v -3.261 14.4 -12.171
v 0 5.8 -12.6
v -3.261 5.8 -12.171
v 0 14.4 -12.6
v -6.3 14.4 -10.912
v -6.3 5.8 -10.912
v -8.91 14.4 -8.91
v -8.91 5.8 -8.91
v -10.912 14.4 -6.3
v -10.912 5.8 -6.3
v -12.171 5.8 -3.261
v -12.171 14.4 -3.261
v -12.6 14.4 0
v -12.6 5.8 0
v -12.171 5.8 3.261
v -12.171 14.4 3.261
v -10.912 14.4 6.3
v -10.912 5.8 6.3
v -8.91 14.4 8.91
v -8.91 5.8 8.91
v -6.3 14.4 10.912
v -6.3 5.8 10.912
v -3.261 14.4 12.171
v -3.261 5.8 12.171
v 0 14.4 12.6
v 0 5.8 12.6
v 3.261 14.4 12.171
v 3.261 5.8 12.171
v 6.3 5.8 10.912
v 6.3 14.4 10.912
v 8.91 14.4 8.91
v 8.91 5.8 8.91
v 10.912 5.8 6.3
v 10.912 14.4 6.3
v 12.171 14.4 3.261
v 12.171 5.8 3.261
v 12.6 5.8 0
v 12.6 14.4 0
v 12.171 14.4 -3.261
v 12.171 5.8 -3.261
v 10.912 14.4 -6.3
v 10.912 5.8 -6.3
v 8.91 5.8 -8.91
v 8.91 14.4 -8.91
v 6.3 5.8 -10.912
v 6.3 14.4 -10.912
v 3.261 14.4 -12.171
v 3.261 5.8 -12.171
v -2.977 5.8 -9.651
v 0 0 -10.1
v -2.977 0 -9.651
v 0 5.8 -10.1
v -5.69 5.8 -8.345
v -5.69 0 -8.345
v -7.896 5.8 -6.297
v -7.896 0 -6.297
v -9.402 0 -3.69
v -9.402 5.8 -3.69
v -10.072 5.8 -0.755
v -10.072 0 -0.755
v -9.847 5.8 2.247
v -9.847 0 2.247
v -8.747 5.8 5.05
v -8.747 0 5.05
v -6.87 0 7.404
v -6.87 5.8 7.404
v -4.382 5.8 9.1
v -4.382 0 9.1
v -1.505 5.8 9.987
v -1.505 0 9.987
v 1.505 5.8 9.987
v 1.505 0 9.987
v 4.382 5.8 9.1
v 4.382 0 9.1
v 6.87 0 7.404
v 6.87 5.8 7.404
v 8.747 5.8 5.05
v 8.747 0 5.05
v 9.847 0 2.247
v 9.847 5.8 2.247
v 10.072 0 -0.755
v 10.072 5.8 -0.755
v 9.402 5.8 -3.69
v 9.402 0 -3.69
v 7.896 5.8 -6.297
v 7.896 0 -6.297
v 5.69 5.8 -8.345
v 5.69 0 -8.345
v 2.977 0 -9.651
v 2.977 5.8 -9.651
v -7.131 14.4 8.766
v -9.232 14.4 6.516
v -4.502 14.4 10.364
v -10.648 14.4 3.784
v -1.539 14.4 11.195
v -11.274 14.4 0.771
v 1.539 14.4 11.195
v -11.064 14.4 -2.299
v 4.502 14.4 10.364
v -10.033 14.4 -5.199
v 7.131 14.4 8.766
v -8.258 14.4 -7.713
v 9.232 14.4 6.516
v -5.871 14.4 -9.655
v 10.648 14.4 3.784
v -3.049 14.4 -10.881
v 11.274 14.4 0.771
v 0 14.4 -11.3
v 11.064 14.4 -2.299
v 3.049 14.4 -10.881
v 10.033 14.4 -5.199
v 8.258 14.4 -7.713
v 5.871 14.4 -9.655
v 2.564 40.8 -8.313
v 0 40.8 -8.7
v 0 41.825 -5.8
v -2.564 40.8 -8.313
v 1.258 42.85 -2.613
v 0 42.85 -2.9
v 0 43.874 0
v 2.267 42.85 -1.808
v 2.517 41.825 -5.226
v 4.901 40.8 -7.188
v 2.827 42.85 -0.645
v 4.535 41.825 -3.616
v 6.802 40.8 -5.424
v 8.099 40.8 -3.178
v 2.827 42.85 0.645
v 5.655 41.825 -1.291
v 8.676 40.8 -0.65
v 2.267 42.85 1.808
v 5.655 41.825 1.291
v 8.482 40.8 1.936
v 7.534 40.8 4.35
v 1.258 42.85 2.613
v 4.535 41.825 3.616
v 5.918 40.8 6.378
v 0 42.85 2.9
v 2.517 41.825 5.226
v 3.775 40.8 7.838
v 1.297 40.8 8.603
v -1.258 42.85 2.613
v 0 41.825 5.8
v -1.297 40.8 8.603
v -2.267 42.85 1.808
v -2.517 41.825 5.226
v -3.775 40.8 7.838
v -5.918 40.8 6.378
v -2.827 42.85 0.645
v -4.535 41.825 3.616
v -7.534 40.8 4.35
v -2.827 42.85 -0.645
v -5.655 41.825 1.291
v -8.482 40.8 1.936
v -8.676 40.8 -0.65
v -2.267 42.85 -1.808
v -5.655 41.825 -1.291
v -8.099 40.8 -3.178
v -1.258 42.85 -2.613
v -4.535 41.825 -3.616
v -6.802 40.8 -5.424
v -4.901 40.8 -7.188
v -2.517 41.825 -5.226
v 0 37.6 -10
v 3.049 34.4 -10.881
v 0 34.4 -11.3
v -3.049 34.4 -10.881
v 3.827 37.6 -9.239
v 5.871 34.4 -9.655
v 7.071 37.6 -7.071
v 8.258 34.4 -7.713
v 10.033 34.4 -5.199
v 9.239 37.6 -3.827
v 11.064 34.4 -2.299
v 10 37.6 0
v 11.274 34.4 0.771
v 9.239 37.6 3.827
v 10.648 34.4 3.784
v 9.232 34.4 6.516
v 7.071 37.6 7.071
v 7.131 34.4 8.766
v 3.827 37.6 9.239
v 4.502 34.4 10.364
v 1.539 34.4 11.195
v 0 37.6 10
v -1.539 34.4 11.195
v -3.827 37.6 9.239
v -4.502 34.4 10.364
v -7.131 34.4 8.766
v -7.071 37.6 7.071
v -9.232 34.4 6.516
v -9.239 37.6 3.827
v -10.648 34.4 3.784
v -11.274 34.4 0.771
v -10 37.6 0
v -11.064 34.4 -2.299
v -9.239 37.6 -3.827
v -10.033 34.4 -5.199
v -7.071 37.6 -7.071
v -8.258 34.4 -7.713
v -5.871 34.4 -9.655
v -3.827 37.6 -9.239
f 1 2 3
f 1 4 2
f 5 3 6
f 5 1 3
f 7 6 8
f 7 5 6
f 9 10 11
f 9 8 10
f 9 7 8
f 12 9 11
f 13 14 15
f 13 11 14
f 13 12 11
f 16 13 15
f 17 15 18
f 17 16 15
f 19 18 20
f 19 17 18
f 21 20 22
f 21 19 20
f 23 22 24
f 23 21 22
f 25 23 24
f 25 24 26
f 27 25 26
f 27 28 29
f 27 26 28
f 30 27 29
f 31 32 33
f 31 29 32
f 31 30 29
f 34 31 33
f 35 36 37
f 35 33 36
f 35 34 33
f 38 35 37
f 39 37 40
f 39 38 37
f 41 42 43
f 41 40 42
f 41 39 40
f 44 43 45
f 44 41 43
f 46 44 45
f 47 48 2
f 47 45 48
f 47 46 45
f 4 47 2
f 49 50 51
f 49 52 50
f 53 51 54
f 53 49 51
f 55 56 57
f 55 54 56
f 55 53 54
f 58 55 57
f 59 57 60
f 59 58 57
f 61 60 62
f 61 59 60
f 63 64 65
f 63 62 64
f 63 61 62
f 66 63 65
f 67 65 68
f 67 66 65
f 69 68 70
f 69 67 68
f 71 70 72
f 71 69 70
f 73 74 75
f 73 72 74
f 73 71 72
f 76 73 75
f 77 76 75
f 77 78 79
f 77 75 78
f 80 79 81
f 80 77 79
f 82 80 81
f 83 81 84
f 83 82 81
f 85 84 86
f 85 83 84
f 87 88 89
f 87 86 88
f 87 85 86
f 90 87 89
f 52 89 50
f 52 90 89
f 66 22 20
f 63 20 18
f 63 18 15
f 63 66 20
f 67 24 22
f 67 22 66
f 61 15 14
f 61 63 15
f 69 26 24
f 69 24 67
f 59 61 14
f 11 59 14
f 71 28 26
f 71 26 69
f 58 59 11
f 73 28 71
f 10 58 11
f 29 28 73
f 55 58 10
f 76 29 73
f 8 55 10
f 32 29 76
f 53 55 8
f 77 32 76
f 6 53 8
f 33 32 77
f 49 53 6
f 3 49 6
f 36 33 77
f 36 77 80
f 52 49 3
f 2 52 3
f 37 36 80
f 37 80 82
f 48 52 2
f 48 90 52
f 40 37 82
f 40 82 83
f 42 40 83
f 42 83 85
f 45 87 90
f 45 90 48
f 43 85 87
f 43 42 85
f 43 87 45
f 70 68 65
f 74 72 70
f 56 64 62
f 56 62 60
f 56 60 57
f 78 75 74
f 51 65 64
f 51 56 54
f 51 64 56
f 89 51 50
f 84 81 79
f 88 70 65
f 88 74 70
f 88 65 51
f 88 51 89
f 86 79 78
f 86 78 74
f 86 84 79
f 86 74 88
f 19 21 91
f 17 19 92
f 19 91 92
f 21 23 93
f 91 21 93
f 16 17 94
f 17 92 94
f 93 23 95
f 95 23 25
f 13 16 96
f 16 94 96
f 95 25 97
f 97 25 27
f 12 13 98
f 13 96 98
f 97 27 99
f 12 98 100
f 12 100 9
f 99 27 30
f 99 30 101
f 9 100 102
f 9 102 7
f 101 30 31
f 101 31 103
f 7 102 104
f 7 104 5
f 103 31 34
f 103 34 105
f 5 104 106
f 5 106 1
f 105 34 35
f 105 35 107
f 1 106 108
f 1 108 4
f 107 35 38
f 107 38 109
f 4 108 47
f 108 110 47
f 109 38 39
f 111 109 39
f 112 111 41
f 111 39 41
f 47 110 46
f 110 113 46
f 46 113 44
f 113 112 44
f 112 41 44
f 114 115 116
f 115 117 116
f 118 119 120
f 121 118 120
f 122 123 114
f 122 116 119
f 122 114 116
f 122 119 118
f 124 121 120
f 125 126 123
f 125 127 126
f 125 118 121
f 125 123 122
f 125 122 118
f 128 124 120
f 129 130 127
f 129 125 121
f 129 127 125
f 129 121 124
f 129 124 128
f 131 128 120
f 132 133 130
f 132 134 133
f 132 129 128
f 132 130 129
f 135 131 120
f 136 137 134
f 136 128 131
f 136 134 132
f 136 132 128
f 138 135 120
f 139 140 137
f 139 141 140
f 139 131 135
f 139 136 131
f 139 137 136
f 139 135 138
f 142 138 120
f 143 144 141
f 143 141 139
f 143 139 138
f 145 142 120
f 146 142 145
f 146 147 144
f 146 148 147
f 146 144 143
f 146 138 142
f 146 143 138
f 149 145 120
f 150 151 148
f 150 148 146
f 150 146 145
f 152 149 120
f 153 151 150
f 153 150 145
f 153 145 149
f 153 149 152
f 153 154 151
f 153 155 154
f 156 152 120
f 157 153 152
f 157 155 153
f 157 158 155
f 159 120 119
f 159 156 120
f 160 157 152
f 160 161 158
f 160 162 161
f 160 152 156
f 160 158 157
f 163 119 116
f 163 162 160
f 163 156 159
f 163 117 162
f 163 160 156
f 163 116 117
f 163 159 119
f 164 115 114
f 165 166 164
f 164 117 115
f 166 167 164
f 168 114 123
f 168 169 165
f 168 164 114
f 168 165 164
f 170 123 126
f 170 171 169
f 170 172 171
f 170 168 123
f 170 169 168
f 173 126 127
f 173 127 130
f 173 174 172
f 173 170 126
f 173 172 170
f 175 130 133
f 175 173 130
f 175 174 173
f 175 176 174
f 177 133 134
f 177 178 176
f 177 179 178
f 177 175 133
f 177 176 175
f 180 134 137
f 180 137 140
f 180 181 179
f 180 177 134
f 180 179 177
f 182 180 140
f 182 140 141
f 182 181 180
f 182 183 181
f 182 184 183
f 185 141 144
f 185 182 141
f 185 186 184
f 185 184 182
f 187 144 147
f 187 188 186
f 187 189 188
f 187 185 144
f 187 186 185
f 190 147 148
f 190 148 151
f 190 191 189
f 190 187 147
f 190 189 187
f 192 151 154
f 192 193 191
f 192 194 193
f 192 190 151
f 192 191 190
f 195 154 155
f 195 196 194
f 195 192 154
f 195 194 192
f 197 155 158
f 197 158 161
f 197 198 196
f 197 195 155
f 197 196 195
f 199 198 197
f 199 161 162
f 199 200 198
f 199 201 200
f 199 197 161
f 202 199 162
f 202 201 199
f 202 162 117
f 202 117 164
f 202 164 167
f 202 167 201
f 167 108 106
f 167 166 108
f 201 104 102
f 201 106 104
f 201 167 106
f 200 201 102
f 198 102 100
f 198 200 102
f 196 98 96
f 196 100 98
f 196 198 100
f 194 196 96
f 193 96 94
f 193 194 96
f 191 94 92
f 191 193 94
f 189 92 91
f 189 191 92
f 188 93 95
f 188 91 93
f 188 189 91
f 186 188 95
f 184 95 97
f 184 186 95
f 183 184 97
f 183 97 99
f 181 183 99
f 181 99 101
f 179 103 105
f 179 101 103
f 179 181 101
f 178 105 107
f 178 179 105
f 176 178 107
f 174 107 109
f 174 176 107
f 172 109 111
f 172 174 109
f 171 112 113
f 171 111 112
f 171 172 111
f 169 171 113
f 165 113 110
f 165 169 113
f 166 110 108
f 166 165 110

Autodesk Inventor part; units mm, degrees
ref_plane "YZ Plane" through (0, 0, 0) normal (1, 0, 0) x (0, 1, 0)
ref_plane "XZ Plane" through (0, 0, 0) normal (0, 1, 0) x (-1, 0, 0)
ref_plane "XY Plane" through (0, 0, 0) normal (0, 0, 1) x (1, 0, 0)
sketch "Sketch1" plane through (0, 0, 0) normal (1, 0, 0) x (0, 1, 0)
  line L0 (0, 0) -> (0, -10.1)
  line L1 (0, -10.1) -> (5.8, -10.1)
  line L2 (5.8, -10.1) -> (5.8, -12.6)
  line L3 (5.8, -12.6) -> (14.4, -12.6)
  line L4 (14.4, -12.6) -> (14.4, -11.3)
  line L5 (14.4, -11.3) -> (34.4, -11.3)
  line L6 (34.4, -11.3) -> (40.8, -11.3)
  line L7 (40.8, -11.3) -> (40.8, -8.7)
  line L8 (40.8, -8.7) -> (34.4, -11.3)
  line L9 (40.8, -8.7) -> (43.8745, 0)
  line L10 (43.8745, 0) -> (0, 0)
  dimension "d0" = 10.1
  dimension "d1" = 5.8
  dimension "d2" = 90
  dimension "d3" = 2.5
  dimension "d4" = 90
  dimension "d5" = 8.6
  dimension "d6" = 1.3
  dimension "d7" = 90
  dimension "d8" = 20
  dimension "d9" = 6.4
  dimension "d10" = 2.6
revolve "Revolution1" add sketch "Sketch1" angle 360 about axis through (0, 43.8745, 0) along (0, -1, 0) contours L10 L9 L8 L5 L4 L3 L2 L1 L0
properties part number "30_CUBE_openSIM_ObjectiveLens_10x"
